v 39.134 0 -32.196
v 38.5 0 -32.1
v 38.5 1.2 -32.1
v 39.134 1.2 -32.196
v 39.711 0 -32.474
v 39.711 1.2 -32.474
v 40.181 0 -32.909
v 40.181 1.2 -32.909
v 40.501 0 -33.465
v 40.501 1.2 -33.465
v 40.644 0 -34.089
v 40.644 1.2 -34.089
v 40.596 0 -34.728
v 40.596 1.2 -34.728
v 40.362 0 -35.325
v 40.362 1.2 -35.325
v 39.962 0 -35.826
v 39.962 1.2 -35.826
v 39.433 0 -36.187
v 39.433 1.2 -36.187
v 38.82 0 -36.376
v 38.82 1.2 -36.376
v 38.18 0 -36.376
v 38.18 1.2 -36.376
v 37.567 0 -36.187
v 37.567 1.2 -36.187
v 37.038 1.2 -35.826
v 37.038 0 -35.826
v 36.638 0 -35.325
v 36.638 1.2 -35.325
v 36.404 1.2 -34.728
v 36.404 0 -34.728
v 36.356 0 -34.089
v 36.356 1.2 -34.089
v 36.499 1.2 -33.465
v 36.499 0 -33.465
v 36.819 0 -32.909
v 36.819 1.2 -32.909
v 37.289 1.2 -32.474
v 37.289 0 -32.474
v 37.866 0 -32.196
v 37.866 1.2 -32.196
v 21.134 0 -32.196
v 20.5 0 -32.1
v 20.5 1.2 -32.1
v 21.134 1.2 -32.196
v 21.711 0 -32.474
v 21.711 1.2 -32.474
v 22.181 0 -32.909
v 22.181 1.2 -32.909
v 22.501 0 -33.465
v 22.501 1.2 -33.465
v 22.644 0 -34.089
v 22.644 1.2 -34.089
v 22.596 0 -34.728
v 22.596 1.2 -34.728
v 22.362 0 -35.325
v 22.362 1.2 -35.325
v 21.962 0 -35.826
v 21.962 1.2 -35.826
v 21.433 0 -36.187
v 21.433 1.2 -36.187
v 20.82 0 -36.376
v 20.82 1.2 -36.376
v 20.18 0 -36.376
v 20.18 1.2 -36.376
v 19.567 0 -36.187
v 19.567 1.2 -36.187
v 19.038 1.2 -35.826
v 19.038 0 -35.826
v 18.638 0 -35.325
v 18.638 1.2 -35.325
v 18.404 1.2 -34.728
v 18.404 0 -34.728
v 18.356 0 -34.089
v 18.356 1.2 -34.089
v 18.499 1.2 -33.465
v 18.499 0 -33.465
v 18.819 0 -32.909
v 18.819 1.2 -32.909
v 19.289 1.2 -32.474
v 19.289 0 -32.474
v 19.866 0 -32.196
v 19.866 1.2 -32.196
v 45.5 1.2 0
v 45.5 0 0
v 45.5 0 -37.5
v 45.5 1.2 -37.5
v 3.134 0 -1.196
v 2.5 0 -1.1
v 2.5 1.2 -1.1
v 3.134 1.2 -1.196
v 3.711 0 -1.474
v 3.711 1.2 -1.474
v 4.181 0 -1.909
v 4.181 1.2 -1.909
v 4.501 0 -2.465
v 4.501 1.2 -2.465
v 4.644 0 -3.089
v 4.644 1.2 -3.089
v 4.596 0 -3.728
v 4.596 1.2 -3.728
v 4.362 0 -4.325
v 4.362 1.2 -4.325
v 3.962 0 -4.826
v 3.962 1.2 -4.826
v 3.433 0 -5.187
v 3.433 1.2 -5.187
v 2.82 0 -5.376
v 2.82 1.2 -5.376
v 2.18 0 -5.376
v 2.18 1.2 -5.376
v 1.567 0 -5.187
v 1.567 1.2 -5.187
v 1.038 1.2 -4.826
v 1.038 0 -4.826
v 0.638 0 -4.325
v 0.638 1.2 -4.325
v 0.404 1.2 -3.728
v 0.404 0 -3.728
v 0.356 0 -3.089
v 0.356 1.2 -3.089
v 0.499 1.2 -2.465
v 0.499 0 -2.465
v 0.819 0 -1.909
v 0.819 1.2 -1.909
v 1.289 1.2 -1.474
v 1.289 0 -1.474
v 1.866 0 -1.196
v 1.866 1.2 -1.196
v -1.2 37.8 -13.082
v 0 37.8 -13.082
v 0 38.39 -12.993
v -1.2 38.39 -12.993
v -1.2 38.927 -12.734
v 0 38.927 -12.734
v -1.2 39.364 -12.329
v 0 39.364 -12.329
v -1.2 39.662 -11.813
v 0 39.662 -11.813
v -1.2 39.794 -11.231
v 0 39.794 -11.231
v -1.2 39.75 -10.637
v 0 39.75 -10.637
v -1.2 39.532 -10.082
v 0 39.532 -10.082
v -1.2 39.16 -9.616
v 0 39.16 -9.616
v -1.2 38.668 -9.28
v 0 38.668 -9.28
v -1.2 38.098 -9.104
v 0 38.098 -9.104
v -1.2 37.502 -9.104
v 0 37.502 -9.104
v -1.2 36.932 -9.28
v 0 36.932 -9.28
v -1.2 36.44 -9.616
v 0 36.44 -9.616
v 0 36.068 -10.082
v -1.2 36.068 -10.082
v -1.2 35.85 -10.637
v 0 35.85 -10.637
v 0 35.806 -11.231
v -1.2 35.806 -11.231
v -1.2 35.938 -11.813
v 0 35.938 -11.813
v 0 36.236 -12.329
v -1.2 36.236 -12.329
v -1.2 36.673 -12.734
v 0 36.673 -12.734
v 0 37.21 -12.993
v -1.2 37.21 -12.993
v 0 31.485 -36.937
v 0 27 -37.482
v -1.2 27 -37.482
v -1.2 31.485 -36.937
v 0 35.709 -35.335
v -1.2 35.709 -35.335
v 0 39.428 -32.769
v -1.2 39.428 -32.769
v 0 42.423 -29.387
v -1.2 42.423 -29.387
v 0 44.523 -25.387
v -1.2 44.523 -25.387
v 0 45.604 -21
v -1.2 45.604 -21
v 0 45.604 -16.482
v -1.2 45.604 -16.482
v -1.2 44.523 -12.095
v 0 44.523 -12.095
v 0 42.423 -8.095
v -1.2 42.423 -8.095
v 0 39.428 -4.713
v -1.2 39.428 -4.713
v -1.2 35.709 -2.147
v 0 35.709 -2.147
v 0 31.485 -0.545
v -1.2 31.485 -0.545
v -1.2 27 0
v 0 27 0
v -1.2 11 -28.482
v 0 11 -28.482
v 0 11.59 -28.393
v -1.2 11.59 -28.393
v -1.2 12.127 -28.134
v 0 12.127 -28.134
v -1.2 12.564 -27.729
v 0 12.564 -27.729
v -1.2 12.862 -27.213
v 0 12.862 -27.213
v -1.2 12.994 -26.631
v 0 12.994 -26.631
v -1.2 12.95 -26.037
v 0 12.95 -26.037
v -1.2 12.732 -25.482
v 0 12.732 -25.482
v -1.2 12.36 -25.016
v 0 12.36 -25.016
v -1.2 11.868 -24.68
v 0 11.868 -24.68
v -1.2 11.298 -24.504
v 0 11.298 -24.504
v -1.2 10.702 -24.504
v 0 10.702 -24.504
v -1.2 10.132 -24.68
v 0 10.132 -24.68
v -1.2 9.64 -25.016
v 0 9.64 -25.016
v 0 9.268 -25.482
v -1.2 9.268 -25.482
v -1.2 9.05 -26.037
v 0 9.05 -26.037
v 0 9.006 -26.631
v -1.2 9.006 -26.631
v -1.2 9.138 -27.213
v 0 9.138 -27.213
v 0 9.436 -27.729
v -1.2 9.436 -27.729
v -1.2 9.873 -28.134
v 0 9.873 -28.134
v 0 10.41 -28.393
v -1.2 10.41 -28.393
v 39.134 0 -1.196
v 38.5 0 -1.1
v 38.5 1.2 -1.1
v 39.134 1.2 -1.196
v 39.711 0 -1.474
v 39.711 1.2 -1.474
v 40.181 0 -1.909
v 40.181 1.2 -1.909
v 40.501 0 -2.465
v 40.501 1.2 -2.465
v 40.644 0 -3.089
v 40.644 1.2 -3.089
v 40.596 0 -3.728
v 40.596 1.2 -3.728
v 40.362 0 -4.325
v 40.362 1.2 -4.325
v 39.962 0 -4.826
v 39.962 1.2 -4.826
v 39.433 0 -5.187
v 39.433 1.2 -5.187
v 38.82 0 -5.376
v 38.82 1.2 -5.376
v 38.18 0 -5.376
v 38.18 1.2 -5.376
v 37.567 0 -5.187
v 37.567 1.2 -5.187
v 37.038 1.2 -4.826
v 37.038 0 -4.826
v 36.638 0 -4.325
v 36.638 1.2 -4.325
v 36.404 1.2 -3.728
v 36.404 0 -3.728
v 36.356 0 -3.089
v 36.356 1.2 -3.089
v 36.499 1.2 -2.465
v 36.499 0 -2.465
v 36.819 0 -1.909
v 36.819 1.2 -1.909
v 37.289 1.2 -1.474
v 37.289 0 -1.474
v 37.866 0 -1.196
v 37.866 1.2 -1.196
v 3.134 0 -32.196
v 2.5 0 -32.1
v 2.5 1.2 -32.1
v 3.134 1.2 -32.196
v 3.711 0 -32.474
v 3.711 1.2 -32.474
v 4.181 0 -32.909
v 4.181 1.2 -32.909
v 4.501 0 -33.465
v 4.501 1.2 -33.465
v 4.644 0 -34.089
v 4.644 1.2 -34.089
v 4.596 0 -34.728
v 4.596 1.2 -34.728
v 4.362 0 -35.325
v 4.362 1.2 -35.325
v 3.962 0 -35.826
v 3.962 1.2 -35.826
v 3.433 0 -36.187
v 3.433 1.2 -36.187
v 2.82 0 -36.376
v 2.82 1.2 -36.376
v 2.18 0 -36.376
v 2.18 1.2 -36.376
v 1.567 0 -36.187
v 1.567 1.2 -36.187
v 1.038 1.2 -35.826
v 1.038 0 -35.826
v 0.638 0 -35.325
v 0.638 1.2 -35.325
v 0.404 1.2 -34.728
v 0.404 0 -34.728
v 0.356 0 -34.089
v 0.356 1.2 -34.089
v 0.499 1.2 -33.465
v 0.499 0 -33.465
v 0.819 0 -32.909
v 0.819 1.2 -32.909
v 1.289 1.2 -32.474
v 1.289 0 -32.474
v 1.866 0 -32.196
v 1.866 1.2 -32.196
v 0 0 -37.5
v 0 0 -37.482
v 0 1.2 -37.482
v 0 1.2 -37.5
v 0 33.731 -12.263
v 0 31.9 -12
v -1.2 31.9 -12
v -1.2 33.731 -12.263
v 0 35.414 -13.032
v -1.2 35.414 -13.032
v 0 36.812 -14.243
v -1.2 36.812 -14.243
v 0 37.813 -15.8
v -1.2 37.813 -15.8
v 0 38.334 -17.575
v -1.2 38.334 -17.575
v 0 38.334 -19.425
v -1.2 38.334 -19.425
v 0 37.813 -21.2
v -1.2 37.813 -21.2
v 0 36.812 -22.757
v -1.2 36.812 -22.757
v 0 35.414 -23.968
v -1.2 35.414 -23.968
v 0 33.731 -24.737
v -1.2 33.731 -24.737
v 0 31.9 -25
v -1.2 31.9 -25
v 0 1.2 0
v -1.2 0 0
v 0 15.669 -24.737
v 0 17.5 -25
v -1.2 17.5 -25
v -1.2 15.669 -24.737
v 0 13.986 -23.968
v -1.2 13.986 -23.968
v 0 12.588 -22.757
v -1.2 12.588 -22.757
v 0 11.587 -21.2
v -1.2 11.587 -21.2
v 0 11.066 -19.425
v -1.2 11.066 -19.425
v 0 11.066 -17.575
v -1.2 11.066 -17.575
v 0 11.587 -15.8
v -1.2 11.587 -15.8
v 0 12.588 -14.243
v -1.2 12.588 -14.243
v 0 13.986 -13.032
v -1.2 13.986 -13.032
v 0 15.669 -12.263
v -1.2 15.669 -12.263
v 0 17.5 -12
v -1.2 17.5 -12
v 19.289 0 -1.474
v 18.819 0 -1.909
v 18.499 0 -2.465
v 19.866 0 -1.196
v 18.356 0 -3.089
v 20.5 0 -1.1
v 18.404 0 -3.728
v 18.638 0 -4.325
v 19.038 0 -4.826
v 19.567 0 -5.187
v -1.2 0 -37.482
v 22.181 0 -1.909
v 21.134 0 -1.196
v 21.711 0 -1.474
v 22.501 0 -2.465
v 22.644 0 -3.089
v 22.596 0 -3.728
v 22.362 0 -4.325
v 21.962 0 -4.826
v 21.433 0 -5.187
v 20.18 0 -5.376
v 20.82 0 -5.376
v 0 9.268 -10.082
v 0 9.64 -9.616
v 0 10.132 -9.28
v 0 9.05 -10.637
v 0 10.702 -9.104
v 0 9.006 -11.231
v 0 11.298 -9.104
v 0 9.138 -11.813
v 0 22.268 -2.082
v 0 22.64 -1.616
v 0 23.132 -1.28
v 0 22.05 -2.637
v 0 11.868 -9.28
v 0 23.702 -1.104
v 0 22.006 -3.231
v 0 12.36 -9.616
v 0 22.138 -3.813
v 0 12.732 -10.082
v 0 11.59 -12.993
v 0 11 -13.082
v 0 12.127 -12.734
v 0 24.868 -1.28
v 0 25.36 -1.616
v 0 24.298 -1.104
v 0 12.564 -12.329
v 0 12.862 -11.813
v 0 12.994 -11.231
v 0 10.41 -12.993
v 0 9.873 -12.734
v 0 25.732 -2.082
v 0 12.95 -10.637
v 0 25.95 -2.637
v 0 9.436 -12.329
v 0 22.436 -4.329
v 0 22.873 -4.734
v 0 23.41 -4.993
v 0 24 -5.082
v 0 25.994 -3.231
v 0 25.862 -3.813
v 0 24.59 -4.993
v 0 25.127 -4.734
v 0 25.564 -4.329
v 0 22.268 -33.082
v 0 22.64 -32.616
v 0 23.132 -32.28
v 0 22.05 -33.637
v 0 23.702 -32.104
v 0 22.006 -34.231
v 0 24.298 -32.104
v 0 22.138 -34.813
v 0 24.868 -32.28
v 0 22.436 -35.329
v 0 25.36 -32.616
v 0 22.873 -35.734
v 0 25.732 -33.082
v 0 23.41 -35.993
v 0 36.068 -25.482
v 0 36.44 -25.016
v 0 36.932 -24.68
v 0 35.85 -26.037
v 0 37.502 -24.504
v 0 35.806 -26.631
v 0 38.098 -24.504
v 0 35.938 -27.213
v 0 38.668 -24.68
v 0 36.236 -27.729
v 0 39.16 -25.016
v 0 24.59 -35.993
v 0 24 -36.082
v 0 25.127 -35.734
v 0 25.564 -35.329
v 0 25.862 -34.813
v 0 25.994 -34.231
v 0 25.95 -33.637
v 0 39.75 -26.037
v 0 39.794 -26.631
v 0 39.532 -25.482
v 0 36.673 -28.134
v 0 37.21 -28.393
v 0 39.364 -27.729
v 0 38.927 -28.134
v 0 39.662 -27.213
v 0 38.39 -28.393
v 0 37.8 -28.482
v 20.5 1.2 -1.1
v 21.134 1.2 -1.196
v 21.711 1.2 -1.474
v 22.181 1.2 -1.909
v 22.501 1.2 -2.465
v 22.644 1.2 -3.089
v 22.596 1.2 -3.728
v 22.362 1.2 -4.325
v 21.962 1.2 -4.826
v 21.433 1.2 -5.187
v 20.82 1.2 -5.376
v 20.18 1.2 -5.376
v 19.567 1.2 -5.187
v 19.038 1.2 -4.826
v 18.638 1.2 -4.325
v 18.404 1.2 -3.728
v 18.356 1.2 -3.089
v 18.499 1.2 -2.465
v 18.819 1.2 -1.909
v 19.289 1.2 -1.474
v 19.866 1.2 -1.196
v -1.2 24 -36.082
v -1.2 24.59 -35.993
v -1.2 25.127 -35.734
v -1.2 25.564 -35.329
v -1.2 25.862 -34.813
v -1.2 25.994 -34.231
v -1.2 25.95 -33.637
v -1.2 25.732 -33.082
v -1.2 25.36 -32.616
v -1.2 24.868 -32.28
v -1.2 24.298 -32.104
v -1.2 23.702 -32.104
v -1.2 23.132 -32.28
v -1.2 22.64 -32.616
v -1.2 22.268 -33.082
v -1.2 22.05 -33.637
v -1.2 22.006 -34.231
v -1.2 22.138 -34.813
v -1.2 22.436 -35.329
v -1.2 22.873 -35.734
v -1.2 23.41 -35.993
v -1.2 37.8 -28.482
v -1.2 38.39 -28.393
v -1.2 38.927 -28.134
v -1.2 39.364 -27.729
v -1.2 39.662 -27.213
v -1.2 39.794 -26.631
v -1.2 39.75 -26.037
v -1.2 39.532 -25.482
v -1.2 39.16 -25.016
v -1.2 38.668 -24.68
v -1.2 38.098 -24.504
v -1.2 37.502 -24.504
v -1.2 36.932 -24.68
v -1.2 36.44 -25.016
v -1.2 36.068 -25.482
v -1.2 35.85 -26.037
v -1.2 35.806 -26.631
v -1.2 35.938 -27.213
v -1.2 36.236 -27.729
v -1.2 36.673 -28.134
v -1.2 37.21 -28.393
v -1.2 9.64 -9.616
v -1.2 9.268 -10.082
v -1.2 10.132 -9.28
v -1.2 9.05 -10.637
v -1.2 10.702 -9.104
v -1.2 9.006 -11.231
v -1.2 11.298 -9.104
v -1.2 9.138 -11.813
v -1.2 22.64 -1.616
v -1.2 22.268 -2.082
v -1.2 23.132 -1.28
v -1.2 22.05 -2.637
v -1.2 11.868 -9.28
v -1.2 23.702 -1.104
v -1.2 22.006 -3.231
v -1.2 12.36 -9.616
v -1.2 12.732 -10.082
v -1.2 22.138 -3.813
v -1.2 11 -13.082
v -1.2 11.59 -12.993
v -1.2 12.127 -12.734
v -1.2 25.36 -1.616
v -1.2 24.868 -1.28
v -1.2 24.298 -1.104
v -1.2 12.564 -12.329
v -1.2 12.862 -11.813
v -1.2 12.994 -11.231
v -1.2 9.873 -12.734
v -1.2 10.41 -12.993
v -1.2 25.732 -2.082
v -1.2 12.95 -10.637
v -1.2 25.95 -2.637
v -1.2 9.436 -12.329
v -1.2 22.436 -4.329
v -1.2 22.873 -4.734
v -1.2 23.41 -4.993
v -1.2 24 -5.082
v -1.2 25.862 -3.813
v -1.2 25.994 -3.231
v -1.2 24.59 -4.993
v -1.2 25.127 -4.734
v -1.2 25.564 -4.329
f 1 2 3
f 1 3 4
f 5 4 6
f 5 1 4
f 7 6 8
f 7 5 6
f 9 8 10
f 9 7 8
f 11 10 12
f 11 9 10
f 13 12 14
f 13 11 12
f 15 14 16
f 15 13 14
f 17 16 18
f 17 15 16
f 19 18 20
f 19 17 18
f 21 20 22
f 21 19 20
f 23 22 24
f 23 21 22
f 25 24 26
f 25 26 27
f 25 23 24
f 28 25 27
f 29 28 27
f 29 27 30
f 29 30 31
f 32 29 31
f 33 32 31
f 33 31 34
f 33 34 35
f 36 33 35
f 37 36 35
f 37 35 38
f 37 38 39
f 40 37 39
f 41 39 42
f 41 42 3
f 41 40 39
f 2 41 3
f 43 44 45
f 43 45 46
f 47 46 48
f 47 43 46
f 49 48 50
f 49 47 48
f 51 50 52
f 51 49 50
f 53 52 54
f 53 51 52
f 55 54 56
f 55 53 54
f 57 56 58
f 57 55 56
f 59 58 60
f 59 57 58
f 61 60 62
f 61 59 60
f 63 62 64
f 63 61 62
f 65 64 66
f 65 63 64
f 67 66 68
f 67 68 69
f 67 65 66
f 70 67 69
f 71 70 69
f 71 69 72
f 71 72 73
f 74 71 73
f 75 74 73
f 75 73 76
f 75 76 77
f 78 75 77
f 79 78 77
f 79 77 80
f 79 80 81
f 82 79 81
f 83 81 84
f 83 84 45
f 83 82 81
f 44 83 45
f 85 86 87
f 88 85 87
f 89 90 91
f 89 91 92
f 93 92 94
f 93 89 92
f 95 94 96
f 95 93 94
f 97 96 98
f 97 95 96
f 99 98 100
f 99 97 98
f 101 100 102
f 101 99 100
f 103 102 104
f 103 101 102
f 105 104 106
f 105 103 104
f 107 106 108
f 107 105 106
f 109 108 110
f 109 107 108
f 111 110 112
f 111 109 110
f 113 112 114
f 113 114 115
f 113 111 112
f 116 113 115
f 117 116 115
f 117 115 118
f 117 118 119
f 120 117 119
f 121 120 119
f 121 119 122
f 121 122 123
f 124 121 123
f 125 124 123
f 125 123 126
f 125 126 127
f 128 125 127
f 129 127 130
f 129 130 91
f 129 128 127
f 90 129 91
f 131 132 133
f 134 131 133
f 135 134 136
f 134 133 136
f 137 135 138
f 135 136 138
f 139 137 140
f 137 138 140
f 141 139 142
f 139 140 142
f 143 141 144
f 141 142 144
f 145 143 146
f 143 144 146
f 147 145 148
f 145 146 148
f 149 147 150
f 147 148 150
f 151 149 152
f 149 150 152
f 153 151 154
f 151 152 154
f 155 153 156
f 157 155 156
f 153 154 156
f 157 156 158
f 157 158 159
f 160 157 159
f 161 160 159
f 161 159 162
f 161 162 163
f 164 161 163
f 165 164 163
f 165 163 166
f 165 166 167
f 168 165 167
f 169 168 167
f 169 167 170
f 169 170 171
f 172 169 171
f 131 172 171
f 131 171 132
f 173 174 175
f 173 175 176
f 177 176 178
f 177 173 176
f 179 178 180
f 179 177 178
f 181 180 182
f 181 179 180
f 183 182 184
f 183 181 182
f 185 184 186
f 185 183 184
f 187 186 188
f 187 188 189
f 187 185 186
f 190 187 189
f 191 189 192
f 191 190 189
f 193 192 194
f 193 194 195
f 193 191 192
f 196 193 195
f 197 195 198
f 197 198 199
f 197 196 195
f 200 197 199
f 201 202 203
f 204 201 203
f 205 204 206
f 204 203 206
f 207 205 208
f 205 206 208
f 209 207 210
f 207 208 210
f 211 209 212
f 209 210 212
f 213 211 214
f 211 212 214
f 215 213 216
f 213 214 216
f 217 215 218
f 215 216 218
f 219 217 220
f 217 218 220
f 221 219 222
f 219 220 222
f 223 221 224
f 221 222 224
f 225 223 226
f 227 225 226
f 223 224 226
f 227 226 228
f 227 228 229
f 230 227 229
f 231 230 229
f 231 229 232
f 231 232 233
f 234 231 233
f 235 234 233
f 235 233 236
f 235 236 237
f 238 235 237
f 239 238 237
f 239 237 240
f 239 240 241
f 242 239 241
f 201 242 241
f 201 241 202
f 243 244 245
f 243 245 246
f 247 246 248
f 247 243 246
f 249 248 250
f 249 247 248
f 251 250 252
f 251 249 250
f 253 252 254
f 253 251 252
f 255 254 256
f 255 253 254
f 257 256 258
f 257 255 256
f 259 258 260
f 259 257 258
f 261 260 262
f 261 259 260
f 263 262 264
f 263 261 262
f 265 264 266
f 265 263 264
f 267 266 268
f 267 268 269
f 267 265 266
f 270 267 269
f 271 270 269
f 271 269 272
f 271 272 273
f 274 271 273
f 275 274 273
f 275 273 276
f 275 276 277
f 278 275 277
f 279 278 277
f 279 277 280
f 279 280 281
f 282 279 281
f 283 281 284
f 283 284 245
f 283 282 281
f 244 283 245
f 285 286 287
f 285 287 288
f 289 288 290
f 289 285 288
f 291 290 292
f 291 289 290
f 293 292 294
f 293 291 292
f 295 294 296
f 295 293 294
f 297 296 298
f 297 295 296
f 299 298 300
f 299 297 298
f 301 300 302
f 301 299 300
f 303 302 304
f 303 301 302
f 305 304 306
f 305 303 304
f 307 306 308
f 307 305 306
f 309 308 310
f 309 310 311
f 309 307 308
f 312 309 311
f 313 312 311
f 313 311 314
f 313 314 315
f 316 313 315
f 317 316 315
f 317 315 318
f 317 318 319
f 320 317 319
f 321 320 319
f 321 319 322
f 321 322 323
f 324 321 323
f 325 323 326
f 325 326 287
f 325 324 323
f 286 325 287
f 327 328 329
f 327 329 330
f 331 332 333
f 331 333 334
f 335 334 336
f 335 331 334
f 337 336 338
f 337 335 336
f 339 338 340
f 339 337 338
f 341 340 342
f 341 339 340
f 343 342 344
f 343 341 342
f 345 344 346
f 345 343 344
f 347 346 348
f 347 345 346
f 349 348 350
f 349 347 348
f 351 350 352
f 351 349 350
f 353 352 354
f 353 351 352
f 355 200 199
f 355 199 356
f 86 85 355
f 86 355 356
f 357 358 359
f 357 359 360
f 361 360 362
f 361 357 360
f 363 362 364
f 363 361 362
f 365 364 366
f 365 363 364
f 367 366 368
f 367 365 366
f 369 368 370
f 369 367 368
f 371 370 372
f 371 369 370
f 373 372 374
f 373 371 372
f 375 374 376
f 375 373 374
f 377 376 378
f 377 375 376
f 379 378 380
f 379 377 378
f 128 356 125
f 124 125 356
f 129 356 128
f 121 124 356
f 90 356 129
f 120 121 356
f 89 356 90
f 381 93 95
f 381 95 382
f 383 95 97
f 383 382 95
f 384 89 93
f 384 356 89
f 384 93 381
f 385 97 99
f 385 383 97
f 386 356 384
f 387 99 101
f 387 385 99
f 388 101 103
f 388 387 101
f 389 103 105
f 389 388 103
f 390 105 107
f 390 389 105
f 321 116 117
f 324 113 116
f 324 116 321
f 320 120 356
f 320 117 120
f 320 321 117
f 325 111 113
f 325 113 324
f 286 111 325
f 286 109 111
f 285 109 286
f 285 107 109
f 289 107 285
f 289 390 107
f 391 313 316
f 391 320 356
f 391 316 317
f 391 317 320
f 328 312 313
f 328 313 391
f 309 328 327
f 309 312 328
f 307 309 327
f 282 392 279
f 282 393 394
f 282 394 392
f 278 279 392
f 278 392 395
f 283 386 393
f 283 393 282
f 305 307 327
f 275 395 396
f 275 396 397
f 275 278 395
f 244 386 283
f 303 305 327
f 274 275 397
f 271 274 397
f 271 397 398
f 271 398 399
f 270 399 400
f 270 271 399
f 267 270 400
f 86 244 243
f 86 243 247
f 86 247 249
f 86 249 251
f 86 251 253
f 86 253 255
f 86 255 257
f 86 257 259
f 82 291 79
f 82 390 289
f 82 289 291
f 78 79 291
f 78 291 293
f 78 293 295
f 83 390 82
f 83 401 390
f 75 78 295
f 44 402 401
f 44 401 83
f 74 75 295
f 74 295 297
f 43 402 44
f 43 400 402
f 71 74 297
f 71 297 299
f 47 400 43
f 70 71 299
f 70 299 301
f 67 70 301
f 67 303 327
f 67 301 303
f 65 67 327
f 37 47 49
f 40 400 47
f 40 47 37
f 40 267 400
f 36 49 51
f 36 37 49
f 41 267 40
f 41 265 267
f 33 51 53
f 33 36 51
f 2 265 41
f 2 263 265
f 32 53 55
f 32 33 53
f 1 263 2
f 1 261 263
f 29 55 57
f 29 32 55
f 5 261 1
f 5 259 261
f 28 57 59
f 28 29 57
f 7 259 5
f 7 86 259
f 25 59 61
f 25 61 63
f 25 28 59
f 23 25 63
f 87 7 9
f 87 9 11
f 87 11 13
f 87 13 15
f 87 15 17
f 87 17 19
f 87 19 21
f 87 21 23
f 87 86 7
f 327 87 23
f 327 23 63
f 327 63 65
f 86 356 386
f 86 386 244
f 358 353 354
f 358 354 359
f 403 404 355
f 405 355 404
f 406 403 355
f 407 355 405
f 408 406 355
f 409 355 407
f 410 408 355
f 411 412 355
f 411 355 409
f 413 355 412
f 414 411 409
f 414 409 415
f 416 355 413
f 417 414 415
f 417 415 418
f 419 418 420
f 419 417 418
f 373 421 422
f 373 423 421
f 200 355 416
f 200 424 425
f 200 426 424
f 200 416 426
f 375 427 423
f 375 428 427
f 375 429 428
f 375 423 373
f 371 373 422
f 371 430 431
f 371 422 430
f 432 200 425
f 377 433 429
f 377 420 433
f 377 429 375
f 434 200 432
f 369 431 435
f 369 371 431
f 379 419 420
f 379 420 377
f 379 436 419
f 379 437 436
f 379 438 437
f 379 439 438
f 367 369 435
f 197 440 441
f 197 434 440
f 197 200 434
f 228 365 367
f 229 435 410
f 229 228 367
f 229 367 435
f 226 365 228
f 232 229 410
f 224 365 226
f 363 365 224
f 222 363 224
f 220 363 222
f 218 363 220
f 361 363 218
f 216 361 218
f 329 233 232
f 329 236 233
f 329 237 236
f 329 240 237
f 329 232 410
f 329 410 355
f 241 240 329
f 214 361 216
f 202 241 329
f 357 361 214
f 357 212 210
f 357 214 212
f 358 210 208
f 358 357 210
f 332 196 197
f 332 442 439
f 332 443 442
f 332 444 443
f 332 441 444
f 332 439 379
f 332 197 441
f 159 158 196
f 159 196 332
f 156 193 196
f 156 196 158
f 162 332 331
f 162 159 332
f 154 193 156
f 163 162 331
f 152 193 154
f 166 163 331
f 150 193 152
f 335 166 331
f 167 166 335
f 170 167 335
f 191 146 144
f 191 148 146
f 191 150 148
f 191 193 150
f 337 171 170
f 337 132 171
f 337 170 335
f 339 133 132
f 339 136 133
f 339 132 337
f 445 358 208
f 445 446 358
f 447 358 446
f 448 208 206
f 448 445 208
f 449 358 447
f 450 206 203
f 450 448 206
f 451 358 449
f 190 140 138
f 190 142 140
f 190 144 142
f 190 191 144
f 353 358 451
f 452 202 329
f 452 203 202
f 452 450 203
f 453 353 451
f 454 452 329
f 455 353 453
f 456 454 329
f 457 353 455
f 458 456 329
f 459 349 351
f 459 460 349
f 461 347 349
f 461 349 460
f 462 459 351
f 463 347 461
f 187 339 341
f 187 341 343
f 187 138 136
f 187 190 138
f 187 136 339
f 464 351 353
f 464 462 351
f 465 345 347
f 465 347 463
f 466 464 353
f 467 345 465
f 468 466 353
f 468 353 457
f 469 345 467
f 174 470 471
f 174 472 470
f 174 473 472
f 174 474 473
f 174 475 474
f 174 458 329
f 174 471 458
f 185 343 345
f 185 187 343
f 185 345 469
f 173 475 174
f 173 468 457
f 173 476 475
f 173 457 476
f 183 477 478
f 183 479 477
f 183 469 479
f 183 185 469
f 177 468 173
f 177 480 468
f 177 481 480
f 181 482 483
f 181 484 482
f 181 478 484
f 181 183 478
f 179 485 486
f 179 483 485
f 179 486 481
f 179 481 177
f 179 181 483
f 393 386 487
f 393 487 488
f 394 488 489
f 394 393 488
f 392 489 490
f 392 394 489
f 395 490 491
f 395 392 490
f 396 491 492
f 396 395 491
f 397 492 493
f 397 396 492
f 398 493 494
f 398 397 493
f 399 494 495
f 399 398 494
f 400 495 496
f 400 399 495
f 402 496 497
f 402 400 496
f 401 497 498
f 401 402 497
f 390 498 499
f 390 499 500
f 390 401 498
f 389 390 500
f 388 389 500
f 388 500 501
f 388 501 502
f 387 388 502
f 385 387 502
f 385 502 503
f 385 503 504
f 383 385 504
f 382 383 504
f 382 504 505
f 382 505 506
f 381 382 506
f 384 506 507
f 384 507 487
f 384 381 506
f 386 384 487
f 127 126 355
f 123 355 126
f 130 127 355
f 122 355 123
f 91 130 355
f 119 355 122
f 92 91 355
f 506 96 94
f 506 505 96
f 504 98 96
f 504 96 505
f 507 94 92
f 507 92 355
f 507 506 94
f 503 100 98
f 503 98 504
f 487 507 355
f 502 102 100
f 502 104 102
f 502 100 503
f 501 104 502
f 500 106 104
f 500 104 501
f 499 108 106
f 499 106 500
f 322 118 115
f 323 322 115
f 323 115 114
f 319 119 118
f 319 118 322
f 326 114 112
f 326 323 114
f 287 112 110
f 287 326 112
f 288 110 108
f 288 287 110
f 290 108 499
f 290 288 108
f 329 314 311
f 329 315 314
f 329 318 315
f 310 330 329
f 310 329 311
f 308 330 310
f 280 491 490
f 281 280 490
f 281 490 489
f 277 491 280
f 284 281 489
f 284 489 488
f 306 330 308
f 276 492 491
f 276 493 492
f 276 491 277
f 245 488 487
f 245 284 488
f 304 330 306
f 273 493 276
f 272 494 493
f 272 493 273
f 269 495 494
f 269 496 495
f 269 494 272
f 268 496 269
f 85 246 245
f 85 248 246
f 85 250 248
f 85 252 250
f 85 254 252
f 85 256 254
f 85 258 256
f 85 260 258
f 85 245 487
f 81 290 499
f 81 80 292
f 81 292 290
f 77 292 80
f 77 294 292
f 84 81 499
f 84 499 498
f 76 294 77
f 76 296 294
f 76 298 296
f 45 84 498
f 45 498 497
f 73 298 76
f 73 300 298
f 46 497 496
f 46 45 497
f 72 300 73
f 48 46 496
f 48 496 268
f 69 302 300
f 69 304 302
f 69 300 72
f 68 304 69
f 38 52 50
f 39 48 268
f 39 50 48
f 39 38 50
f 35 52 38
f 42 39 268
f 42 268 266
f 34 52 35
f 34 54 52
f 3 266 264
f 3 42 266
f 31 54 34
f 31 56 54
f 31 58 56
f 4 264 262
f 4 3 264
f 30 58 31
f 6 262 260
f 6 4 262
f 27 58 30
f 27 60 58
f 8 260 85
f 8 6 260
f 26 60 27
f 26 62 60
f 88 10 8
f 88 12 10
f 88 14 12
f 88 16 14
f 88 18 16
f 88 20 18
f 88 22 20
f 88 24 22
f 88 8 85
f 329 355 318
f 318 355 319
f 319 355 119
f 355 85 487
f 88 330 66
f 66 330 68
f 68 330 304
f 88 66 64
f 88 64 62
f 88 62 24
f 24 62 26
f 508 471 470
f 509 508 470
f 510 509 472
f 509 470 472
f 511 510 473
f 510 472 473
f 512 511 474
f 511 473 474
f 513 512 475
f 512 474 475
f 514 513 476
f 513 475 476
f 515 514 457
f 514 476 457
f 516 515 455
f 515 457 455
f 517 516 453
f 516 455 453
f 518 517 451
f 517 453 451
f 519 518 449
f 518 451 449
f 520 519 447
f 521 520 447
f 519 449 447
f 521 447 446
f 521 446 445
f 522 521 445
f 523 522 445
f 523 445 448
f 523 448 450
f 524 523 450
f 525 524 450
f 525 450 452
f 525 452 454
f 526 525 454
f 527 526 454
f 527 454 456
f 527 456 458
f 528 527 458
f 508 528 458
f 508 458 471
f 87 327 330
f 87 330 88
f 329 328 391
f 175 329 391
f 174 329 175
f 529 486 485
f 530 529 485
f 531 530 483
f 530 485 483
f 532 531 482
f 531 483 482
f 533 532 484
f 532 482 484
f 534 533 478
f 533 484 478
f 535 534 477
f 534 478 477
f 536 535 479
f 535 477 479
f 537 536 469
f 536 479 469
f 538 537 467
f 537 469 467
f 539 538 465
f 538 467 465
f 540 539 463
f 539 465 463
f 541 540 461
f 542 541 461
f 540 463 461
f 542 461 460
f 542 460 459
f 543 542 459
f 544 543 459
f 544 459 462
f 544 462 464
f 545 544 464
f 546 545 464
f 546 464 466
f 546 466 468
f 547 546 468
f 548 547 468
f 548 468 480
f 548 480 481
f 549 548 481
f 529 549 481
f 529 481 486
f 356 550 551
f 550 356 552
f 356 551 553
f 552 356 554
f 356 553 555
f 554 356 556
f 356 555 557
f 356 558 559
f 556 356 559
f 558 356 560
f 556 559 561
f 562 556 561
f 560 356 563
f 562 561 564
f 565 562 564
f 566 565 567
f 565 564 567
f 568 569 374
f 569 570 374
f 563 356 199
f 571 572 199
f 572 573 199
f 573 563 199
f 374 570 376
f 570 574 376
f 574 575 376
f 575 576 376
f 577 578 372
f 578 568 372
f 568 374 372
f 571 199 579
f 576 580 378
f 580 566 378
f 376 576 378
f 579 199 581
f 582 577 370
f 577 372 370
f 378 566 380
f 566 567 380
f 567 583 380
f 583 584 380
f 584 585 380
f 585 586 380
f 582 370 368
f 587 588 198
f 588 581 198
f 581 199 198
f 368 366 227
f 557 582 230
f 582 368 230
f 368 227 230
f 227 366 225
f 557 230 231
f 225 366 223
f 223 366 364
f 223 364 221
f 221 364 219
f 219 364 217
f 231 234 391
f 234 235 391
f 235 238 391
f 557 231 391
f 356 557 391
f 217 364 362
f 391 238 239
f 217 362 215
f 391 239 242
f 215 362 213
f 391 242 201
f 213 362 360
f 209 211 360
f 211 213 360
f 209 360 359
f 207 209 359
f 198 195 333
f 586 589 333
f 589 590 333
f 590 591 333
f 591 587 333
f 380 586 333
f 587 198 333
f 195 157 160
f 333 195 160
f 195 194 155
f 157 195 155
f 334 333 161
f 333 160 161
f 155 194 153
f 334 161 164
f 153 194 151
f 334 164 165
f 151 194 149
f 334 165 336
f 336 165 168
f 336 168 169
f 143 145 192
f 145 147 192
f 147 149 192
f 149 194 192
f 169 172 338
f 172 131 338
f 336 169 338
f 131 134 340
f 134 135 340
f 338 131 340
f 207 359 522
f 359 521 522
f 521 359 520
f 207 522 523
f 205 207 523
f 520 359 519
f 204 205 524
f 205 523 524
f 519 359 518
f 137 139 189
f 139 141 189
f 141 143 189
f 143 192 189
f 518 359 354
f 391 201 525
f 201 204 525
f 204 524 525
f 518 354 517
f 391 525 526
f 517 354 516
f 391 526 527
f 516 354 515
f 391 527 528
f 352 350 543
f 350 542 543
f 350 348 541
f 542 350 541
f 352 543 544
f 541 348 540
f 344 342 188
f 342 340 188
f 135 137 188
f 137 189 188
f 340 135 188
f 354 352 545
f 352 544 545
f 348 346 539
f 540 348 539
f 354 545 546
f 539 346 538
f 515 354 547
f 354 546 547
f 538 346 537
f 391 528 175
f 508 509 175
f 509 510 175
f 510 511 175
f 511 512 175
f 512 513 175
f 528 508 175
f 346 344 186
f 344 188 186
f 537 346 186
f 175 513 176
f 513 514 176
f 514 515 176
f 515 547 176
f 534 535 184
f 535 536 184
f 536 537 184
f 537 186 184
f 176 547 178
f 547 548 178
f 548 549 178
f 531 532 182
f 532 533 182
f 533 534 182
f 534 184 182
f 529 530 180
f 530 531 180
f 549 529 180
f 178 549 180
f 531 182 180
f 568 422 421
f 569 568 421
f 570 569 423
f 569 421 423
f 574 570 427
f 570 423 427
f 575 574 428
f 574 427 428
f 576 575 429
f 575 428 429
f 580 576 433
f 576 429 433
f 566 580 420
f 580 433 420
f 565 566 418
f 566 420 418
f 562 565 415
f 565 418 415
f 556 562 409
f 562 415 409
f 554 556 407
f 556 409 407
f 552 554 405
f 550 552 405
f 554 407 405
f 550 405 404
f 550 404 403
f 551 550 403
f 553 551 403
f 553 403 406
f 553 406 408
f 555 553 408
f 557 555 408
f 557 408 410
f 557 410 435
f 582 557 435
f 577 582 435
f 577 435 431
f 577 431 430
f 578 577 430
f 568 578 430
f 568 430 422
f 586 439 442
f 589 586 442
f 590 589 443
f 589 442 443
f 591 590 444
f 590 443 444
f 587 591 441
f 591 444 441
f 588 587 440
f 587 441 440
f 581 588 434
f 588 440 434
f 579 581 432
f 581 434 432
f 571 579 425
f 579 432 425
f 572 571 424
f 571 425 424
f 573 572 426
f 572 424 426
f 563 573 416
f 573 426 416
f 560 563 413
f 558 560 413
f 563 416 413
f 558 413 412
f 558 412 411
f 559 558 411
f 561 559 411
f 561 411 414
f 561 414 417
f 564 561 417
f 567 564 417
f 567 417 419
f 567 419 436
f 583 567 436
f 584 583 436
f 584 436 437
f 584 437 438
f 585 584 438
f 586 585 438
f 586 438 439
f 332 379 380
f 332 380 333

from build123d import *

# Parameters (mm, degrees)
ESQUISSE1_W             = 45.5
ESQUISSE1_H             = 37.5
ESQUISSE1_R             = 2.15
BOSS_EXTRU_1_DEPTH      = 1.2
BOSS_EXTRU_2_DEPTH      = 1.2
ENL_V_MAT_EXTRU_2_DEPTH = 75.623947588
ESQUISSE9_R             = 2
ENL_V_MAT_EXTRU_3_DEPTH = 75.623947588


with BuildPart() as part:
    # Esquisse1 → Boss.-Extru.1 (new body)
    with BuildSketch(Plane(origin=(0, 0, 0), x_dir=(1, 0, 0), z_dir=(0, 1, 0))):
        with Locations((22.75, 18.75)):
            Rectangle(ESQUISSE1_W, ESQUISSE1_H)
        with Locations(Location((2.5, 34.25, 0), (0, 0, 270))):
            Circle(ESQUISSE1_R, mode=Mode.SUBTRACT)
        with Locations(Location((20.5, 34.25, 0), (0, 0, 270))):
            Circle(ESQUISSE1_R, mode=Mode.SUBTRACT)
        with Locations(Location((38.5, 34.25, 0), (0, 0, 270))):
            Circle(ESQUISSE1_R, mode=Mode.SUBTRACT)
        with Locations(Location((2.5, 3.25, 0), (0, 0, 270))):
            Circle(ESQUISSE1_R, mode=Mode.SUBTRACT)
        with Locations(Location((20.5, 3.25, 0), (0, 0, 270))):
            Circle(ESQUISSE1_R, mode=Mode.SUBTRACT)
        with Locations(Location((38.5, 3.25, 0), (0, 0, 270))):
            Circle(ESQUISSE1_R, mode=Mode.SUBTRACT)
    extrude(amount=BOSS_EXTRU_1_DEPTH)

    # Esquisse4 → Boss.-Extru.2 (add)
    with BuildSketch(Plane.ZY):
        with BuildLine():
            Line((-37.48187916, 0), (-37.48187916, 27))
            ThreePointArc((-37.48187916, 27), (-18.74093958, 45.74093958), (0, 27))
            Line((0, 27), (0, 0))
            Line((0, 0), (-37.48187916, 0))
        make_face()
    extrude(amount=BOSS_EXTRU_2_DEPTH)

    # Esquisse5 → Enlèv. mat.-Extru.2 (cut, through all)
    with BuildSketch(Plane(origin=(0, 0, 0), x_dir=(0, 0, -1), z_dir=(1, 0, 0))):
        with BuildLine():
            Line((25, 31.9), (25, 17.5))
            ThreePointArc((25, 17.5), (18.5, 11), (12, 17.5))
            Line((12, 17.5), (12, 31.9))
            ThreePointArc((12, 31.9), (18.5, 38.4), (25, 31.9))
        make_face()
    extrude(amount=-ENL_V_MAT_EXTRU_2_DEPTH, mode=Mode.SUBTRACT)

    # Esquisse9 → Enlèv. mat.-Extru.3 (cut, through all)
    with BuildSketch(Plane(origin=(0, 0, 0), x_dir=(0, 0, -1), z_dir=(1, 0, 0))):
        with Locations((26.48187916, 11)):
            Circle(ESQUISSE9_R)
        with Locations((26.48187916, 37.8)):
            Circle(ESQUISSE9_R)
        with Locations((11.08187916, 11)):
            Circle(ESQUISSE9_R)
        with Locations((11.08187916, 37.8)):
            Circle(ESQUISSE9_R)
        with Locations((34.08187916, 24)):
            Circle(ESQUISSE9_R)
        with Locations((3.08187916, 24)):
            Circle(ESQUISSE9_R)
    extrude(amount=-ENL_V_MAT_EXTRU_3_DEPTH, mode=Mode.SUBTRACT)


solid = part.part
